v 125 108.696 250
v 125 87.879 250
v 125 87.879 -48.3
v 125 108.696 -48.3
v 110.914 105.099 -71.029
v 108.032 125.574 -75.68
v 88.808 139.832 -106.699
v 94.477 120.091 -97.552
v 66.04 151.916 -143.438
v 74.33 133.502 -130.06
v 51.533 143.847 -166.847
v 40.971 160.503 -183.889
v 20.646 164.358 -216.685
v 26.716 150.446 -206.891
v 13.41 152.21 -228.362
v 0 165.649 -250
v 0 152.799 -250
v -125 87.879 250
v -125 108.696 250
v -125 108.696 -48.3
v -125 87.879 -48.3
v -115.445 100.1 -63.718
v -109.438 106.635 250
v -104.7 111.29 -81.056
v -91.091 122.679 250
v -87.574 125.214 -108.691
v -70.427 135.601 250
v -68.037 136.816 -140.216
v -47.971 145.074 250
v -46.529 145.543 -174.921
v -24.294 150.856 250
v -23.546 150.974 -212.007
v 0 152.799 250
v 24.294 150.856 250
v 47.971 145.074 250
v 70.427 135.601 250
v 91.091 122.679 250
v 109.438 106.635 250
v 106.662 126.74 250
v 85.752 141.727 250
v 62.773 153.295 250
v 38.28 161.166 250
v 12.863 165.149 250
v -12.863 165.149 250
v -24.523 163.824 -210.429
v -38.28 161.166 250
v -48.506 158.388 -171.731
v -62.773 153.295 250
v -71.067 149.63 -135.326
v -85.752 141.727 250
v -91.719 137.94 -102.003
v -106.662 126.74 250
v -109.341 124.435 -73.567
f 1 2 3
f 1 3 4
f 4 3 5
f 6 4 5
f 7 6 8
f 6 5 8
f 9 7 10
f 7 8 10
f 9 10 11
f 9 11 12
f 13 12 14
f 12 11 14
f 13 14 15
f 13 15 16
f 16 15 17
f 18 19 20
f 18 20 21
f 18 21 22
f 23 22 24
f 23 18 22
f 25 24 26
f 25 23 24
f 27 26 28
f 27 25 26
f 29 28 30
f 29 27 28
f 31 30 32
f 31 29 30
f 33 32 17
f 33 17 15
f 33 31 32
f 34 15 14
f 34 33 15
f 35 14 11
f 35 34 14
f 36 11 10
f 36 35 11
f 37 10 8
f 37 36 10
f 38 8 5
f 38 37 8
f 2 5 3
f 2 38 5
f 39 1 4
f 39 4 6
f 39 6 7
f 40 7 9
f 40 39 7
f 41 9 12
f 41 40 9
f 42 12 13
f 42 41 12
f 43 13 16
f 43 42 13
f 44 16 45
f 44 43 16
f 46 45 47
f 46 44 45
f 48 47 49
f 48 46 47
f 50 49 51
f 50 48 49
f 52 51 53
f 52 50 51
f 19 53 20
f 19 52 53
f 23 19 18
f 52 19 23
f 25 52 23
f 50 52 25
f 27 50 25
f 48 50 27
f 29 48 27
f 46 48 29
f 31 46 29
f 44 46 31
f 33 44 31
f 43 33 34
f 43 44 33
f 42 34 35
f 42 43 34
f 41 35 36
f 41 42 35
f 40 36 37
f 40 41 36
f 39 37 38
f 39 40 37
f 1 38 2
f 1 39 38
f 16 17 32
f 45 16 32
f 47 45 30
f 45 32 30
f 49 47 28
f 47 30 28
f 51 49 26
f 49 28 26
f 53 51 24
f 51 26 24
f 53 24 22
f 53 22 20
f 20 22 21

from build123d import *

# Parameters (mm, degrees)
F1_DEPTH      = 250
F1_DEPTH_BACK = 250
F3_DEPTH      = 165.65046


with BuildPart() as f1:
    # F0 (on Top) → F1 (new body, two sides)
    with BuildSketch(Plane.XY) as f1_sk:
        with BuildLine():
            Line((125, 87.878756), (125, 108.695647))
            ThreePointArc((125, 108.695647), (0, 165.64946), (-125, 108.695647))
            Line((-125, 108.695647), (-125, 87.878756))
            ThreePointArc((-125, 87.878756), (0, 152.799463), (125, 87.878756))
        make_face()
    extrude(amount=F1_DEPTH)
    extrude(f1_sk.sketch, amount=-F1_DEPTH_BACK)

    # F2 (on Front) → F3 (cut, through all)
    with BuildSketch(Plane.XZ):
        Polygon((-125, -250.156015), (0, -250), (-125, -48.299942), align=None)
        Polygon((125, -250), (125, -48.299942), (0, -250), align=None)
    extrude(amount=-F3_DEPTH, mode=Mode.SUBTRACT)


solid = f1.part
